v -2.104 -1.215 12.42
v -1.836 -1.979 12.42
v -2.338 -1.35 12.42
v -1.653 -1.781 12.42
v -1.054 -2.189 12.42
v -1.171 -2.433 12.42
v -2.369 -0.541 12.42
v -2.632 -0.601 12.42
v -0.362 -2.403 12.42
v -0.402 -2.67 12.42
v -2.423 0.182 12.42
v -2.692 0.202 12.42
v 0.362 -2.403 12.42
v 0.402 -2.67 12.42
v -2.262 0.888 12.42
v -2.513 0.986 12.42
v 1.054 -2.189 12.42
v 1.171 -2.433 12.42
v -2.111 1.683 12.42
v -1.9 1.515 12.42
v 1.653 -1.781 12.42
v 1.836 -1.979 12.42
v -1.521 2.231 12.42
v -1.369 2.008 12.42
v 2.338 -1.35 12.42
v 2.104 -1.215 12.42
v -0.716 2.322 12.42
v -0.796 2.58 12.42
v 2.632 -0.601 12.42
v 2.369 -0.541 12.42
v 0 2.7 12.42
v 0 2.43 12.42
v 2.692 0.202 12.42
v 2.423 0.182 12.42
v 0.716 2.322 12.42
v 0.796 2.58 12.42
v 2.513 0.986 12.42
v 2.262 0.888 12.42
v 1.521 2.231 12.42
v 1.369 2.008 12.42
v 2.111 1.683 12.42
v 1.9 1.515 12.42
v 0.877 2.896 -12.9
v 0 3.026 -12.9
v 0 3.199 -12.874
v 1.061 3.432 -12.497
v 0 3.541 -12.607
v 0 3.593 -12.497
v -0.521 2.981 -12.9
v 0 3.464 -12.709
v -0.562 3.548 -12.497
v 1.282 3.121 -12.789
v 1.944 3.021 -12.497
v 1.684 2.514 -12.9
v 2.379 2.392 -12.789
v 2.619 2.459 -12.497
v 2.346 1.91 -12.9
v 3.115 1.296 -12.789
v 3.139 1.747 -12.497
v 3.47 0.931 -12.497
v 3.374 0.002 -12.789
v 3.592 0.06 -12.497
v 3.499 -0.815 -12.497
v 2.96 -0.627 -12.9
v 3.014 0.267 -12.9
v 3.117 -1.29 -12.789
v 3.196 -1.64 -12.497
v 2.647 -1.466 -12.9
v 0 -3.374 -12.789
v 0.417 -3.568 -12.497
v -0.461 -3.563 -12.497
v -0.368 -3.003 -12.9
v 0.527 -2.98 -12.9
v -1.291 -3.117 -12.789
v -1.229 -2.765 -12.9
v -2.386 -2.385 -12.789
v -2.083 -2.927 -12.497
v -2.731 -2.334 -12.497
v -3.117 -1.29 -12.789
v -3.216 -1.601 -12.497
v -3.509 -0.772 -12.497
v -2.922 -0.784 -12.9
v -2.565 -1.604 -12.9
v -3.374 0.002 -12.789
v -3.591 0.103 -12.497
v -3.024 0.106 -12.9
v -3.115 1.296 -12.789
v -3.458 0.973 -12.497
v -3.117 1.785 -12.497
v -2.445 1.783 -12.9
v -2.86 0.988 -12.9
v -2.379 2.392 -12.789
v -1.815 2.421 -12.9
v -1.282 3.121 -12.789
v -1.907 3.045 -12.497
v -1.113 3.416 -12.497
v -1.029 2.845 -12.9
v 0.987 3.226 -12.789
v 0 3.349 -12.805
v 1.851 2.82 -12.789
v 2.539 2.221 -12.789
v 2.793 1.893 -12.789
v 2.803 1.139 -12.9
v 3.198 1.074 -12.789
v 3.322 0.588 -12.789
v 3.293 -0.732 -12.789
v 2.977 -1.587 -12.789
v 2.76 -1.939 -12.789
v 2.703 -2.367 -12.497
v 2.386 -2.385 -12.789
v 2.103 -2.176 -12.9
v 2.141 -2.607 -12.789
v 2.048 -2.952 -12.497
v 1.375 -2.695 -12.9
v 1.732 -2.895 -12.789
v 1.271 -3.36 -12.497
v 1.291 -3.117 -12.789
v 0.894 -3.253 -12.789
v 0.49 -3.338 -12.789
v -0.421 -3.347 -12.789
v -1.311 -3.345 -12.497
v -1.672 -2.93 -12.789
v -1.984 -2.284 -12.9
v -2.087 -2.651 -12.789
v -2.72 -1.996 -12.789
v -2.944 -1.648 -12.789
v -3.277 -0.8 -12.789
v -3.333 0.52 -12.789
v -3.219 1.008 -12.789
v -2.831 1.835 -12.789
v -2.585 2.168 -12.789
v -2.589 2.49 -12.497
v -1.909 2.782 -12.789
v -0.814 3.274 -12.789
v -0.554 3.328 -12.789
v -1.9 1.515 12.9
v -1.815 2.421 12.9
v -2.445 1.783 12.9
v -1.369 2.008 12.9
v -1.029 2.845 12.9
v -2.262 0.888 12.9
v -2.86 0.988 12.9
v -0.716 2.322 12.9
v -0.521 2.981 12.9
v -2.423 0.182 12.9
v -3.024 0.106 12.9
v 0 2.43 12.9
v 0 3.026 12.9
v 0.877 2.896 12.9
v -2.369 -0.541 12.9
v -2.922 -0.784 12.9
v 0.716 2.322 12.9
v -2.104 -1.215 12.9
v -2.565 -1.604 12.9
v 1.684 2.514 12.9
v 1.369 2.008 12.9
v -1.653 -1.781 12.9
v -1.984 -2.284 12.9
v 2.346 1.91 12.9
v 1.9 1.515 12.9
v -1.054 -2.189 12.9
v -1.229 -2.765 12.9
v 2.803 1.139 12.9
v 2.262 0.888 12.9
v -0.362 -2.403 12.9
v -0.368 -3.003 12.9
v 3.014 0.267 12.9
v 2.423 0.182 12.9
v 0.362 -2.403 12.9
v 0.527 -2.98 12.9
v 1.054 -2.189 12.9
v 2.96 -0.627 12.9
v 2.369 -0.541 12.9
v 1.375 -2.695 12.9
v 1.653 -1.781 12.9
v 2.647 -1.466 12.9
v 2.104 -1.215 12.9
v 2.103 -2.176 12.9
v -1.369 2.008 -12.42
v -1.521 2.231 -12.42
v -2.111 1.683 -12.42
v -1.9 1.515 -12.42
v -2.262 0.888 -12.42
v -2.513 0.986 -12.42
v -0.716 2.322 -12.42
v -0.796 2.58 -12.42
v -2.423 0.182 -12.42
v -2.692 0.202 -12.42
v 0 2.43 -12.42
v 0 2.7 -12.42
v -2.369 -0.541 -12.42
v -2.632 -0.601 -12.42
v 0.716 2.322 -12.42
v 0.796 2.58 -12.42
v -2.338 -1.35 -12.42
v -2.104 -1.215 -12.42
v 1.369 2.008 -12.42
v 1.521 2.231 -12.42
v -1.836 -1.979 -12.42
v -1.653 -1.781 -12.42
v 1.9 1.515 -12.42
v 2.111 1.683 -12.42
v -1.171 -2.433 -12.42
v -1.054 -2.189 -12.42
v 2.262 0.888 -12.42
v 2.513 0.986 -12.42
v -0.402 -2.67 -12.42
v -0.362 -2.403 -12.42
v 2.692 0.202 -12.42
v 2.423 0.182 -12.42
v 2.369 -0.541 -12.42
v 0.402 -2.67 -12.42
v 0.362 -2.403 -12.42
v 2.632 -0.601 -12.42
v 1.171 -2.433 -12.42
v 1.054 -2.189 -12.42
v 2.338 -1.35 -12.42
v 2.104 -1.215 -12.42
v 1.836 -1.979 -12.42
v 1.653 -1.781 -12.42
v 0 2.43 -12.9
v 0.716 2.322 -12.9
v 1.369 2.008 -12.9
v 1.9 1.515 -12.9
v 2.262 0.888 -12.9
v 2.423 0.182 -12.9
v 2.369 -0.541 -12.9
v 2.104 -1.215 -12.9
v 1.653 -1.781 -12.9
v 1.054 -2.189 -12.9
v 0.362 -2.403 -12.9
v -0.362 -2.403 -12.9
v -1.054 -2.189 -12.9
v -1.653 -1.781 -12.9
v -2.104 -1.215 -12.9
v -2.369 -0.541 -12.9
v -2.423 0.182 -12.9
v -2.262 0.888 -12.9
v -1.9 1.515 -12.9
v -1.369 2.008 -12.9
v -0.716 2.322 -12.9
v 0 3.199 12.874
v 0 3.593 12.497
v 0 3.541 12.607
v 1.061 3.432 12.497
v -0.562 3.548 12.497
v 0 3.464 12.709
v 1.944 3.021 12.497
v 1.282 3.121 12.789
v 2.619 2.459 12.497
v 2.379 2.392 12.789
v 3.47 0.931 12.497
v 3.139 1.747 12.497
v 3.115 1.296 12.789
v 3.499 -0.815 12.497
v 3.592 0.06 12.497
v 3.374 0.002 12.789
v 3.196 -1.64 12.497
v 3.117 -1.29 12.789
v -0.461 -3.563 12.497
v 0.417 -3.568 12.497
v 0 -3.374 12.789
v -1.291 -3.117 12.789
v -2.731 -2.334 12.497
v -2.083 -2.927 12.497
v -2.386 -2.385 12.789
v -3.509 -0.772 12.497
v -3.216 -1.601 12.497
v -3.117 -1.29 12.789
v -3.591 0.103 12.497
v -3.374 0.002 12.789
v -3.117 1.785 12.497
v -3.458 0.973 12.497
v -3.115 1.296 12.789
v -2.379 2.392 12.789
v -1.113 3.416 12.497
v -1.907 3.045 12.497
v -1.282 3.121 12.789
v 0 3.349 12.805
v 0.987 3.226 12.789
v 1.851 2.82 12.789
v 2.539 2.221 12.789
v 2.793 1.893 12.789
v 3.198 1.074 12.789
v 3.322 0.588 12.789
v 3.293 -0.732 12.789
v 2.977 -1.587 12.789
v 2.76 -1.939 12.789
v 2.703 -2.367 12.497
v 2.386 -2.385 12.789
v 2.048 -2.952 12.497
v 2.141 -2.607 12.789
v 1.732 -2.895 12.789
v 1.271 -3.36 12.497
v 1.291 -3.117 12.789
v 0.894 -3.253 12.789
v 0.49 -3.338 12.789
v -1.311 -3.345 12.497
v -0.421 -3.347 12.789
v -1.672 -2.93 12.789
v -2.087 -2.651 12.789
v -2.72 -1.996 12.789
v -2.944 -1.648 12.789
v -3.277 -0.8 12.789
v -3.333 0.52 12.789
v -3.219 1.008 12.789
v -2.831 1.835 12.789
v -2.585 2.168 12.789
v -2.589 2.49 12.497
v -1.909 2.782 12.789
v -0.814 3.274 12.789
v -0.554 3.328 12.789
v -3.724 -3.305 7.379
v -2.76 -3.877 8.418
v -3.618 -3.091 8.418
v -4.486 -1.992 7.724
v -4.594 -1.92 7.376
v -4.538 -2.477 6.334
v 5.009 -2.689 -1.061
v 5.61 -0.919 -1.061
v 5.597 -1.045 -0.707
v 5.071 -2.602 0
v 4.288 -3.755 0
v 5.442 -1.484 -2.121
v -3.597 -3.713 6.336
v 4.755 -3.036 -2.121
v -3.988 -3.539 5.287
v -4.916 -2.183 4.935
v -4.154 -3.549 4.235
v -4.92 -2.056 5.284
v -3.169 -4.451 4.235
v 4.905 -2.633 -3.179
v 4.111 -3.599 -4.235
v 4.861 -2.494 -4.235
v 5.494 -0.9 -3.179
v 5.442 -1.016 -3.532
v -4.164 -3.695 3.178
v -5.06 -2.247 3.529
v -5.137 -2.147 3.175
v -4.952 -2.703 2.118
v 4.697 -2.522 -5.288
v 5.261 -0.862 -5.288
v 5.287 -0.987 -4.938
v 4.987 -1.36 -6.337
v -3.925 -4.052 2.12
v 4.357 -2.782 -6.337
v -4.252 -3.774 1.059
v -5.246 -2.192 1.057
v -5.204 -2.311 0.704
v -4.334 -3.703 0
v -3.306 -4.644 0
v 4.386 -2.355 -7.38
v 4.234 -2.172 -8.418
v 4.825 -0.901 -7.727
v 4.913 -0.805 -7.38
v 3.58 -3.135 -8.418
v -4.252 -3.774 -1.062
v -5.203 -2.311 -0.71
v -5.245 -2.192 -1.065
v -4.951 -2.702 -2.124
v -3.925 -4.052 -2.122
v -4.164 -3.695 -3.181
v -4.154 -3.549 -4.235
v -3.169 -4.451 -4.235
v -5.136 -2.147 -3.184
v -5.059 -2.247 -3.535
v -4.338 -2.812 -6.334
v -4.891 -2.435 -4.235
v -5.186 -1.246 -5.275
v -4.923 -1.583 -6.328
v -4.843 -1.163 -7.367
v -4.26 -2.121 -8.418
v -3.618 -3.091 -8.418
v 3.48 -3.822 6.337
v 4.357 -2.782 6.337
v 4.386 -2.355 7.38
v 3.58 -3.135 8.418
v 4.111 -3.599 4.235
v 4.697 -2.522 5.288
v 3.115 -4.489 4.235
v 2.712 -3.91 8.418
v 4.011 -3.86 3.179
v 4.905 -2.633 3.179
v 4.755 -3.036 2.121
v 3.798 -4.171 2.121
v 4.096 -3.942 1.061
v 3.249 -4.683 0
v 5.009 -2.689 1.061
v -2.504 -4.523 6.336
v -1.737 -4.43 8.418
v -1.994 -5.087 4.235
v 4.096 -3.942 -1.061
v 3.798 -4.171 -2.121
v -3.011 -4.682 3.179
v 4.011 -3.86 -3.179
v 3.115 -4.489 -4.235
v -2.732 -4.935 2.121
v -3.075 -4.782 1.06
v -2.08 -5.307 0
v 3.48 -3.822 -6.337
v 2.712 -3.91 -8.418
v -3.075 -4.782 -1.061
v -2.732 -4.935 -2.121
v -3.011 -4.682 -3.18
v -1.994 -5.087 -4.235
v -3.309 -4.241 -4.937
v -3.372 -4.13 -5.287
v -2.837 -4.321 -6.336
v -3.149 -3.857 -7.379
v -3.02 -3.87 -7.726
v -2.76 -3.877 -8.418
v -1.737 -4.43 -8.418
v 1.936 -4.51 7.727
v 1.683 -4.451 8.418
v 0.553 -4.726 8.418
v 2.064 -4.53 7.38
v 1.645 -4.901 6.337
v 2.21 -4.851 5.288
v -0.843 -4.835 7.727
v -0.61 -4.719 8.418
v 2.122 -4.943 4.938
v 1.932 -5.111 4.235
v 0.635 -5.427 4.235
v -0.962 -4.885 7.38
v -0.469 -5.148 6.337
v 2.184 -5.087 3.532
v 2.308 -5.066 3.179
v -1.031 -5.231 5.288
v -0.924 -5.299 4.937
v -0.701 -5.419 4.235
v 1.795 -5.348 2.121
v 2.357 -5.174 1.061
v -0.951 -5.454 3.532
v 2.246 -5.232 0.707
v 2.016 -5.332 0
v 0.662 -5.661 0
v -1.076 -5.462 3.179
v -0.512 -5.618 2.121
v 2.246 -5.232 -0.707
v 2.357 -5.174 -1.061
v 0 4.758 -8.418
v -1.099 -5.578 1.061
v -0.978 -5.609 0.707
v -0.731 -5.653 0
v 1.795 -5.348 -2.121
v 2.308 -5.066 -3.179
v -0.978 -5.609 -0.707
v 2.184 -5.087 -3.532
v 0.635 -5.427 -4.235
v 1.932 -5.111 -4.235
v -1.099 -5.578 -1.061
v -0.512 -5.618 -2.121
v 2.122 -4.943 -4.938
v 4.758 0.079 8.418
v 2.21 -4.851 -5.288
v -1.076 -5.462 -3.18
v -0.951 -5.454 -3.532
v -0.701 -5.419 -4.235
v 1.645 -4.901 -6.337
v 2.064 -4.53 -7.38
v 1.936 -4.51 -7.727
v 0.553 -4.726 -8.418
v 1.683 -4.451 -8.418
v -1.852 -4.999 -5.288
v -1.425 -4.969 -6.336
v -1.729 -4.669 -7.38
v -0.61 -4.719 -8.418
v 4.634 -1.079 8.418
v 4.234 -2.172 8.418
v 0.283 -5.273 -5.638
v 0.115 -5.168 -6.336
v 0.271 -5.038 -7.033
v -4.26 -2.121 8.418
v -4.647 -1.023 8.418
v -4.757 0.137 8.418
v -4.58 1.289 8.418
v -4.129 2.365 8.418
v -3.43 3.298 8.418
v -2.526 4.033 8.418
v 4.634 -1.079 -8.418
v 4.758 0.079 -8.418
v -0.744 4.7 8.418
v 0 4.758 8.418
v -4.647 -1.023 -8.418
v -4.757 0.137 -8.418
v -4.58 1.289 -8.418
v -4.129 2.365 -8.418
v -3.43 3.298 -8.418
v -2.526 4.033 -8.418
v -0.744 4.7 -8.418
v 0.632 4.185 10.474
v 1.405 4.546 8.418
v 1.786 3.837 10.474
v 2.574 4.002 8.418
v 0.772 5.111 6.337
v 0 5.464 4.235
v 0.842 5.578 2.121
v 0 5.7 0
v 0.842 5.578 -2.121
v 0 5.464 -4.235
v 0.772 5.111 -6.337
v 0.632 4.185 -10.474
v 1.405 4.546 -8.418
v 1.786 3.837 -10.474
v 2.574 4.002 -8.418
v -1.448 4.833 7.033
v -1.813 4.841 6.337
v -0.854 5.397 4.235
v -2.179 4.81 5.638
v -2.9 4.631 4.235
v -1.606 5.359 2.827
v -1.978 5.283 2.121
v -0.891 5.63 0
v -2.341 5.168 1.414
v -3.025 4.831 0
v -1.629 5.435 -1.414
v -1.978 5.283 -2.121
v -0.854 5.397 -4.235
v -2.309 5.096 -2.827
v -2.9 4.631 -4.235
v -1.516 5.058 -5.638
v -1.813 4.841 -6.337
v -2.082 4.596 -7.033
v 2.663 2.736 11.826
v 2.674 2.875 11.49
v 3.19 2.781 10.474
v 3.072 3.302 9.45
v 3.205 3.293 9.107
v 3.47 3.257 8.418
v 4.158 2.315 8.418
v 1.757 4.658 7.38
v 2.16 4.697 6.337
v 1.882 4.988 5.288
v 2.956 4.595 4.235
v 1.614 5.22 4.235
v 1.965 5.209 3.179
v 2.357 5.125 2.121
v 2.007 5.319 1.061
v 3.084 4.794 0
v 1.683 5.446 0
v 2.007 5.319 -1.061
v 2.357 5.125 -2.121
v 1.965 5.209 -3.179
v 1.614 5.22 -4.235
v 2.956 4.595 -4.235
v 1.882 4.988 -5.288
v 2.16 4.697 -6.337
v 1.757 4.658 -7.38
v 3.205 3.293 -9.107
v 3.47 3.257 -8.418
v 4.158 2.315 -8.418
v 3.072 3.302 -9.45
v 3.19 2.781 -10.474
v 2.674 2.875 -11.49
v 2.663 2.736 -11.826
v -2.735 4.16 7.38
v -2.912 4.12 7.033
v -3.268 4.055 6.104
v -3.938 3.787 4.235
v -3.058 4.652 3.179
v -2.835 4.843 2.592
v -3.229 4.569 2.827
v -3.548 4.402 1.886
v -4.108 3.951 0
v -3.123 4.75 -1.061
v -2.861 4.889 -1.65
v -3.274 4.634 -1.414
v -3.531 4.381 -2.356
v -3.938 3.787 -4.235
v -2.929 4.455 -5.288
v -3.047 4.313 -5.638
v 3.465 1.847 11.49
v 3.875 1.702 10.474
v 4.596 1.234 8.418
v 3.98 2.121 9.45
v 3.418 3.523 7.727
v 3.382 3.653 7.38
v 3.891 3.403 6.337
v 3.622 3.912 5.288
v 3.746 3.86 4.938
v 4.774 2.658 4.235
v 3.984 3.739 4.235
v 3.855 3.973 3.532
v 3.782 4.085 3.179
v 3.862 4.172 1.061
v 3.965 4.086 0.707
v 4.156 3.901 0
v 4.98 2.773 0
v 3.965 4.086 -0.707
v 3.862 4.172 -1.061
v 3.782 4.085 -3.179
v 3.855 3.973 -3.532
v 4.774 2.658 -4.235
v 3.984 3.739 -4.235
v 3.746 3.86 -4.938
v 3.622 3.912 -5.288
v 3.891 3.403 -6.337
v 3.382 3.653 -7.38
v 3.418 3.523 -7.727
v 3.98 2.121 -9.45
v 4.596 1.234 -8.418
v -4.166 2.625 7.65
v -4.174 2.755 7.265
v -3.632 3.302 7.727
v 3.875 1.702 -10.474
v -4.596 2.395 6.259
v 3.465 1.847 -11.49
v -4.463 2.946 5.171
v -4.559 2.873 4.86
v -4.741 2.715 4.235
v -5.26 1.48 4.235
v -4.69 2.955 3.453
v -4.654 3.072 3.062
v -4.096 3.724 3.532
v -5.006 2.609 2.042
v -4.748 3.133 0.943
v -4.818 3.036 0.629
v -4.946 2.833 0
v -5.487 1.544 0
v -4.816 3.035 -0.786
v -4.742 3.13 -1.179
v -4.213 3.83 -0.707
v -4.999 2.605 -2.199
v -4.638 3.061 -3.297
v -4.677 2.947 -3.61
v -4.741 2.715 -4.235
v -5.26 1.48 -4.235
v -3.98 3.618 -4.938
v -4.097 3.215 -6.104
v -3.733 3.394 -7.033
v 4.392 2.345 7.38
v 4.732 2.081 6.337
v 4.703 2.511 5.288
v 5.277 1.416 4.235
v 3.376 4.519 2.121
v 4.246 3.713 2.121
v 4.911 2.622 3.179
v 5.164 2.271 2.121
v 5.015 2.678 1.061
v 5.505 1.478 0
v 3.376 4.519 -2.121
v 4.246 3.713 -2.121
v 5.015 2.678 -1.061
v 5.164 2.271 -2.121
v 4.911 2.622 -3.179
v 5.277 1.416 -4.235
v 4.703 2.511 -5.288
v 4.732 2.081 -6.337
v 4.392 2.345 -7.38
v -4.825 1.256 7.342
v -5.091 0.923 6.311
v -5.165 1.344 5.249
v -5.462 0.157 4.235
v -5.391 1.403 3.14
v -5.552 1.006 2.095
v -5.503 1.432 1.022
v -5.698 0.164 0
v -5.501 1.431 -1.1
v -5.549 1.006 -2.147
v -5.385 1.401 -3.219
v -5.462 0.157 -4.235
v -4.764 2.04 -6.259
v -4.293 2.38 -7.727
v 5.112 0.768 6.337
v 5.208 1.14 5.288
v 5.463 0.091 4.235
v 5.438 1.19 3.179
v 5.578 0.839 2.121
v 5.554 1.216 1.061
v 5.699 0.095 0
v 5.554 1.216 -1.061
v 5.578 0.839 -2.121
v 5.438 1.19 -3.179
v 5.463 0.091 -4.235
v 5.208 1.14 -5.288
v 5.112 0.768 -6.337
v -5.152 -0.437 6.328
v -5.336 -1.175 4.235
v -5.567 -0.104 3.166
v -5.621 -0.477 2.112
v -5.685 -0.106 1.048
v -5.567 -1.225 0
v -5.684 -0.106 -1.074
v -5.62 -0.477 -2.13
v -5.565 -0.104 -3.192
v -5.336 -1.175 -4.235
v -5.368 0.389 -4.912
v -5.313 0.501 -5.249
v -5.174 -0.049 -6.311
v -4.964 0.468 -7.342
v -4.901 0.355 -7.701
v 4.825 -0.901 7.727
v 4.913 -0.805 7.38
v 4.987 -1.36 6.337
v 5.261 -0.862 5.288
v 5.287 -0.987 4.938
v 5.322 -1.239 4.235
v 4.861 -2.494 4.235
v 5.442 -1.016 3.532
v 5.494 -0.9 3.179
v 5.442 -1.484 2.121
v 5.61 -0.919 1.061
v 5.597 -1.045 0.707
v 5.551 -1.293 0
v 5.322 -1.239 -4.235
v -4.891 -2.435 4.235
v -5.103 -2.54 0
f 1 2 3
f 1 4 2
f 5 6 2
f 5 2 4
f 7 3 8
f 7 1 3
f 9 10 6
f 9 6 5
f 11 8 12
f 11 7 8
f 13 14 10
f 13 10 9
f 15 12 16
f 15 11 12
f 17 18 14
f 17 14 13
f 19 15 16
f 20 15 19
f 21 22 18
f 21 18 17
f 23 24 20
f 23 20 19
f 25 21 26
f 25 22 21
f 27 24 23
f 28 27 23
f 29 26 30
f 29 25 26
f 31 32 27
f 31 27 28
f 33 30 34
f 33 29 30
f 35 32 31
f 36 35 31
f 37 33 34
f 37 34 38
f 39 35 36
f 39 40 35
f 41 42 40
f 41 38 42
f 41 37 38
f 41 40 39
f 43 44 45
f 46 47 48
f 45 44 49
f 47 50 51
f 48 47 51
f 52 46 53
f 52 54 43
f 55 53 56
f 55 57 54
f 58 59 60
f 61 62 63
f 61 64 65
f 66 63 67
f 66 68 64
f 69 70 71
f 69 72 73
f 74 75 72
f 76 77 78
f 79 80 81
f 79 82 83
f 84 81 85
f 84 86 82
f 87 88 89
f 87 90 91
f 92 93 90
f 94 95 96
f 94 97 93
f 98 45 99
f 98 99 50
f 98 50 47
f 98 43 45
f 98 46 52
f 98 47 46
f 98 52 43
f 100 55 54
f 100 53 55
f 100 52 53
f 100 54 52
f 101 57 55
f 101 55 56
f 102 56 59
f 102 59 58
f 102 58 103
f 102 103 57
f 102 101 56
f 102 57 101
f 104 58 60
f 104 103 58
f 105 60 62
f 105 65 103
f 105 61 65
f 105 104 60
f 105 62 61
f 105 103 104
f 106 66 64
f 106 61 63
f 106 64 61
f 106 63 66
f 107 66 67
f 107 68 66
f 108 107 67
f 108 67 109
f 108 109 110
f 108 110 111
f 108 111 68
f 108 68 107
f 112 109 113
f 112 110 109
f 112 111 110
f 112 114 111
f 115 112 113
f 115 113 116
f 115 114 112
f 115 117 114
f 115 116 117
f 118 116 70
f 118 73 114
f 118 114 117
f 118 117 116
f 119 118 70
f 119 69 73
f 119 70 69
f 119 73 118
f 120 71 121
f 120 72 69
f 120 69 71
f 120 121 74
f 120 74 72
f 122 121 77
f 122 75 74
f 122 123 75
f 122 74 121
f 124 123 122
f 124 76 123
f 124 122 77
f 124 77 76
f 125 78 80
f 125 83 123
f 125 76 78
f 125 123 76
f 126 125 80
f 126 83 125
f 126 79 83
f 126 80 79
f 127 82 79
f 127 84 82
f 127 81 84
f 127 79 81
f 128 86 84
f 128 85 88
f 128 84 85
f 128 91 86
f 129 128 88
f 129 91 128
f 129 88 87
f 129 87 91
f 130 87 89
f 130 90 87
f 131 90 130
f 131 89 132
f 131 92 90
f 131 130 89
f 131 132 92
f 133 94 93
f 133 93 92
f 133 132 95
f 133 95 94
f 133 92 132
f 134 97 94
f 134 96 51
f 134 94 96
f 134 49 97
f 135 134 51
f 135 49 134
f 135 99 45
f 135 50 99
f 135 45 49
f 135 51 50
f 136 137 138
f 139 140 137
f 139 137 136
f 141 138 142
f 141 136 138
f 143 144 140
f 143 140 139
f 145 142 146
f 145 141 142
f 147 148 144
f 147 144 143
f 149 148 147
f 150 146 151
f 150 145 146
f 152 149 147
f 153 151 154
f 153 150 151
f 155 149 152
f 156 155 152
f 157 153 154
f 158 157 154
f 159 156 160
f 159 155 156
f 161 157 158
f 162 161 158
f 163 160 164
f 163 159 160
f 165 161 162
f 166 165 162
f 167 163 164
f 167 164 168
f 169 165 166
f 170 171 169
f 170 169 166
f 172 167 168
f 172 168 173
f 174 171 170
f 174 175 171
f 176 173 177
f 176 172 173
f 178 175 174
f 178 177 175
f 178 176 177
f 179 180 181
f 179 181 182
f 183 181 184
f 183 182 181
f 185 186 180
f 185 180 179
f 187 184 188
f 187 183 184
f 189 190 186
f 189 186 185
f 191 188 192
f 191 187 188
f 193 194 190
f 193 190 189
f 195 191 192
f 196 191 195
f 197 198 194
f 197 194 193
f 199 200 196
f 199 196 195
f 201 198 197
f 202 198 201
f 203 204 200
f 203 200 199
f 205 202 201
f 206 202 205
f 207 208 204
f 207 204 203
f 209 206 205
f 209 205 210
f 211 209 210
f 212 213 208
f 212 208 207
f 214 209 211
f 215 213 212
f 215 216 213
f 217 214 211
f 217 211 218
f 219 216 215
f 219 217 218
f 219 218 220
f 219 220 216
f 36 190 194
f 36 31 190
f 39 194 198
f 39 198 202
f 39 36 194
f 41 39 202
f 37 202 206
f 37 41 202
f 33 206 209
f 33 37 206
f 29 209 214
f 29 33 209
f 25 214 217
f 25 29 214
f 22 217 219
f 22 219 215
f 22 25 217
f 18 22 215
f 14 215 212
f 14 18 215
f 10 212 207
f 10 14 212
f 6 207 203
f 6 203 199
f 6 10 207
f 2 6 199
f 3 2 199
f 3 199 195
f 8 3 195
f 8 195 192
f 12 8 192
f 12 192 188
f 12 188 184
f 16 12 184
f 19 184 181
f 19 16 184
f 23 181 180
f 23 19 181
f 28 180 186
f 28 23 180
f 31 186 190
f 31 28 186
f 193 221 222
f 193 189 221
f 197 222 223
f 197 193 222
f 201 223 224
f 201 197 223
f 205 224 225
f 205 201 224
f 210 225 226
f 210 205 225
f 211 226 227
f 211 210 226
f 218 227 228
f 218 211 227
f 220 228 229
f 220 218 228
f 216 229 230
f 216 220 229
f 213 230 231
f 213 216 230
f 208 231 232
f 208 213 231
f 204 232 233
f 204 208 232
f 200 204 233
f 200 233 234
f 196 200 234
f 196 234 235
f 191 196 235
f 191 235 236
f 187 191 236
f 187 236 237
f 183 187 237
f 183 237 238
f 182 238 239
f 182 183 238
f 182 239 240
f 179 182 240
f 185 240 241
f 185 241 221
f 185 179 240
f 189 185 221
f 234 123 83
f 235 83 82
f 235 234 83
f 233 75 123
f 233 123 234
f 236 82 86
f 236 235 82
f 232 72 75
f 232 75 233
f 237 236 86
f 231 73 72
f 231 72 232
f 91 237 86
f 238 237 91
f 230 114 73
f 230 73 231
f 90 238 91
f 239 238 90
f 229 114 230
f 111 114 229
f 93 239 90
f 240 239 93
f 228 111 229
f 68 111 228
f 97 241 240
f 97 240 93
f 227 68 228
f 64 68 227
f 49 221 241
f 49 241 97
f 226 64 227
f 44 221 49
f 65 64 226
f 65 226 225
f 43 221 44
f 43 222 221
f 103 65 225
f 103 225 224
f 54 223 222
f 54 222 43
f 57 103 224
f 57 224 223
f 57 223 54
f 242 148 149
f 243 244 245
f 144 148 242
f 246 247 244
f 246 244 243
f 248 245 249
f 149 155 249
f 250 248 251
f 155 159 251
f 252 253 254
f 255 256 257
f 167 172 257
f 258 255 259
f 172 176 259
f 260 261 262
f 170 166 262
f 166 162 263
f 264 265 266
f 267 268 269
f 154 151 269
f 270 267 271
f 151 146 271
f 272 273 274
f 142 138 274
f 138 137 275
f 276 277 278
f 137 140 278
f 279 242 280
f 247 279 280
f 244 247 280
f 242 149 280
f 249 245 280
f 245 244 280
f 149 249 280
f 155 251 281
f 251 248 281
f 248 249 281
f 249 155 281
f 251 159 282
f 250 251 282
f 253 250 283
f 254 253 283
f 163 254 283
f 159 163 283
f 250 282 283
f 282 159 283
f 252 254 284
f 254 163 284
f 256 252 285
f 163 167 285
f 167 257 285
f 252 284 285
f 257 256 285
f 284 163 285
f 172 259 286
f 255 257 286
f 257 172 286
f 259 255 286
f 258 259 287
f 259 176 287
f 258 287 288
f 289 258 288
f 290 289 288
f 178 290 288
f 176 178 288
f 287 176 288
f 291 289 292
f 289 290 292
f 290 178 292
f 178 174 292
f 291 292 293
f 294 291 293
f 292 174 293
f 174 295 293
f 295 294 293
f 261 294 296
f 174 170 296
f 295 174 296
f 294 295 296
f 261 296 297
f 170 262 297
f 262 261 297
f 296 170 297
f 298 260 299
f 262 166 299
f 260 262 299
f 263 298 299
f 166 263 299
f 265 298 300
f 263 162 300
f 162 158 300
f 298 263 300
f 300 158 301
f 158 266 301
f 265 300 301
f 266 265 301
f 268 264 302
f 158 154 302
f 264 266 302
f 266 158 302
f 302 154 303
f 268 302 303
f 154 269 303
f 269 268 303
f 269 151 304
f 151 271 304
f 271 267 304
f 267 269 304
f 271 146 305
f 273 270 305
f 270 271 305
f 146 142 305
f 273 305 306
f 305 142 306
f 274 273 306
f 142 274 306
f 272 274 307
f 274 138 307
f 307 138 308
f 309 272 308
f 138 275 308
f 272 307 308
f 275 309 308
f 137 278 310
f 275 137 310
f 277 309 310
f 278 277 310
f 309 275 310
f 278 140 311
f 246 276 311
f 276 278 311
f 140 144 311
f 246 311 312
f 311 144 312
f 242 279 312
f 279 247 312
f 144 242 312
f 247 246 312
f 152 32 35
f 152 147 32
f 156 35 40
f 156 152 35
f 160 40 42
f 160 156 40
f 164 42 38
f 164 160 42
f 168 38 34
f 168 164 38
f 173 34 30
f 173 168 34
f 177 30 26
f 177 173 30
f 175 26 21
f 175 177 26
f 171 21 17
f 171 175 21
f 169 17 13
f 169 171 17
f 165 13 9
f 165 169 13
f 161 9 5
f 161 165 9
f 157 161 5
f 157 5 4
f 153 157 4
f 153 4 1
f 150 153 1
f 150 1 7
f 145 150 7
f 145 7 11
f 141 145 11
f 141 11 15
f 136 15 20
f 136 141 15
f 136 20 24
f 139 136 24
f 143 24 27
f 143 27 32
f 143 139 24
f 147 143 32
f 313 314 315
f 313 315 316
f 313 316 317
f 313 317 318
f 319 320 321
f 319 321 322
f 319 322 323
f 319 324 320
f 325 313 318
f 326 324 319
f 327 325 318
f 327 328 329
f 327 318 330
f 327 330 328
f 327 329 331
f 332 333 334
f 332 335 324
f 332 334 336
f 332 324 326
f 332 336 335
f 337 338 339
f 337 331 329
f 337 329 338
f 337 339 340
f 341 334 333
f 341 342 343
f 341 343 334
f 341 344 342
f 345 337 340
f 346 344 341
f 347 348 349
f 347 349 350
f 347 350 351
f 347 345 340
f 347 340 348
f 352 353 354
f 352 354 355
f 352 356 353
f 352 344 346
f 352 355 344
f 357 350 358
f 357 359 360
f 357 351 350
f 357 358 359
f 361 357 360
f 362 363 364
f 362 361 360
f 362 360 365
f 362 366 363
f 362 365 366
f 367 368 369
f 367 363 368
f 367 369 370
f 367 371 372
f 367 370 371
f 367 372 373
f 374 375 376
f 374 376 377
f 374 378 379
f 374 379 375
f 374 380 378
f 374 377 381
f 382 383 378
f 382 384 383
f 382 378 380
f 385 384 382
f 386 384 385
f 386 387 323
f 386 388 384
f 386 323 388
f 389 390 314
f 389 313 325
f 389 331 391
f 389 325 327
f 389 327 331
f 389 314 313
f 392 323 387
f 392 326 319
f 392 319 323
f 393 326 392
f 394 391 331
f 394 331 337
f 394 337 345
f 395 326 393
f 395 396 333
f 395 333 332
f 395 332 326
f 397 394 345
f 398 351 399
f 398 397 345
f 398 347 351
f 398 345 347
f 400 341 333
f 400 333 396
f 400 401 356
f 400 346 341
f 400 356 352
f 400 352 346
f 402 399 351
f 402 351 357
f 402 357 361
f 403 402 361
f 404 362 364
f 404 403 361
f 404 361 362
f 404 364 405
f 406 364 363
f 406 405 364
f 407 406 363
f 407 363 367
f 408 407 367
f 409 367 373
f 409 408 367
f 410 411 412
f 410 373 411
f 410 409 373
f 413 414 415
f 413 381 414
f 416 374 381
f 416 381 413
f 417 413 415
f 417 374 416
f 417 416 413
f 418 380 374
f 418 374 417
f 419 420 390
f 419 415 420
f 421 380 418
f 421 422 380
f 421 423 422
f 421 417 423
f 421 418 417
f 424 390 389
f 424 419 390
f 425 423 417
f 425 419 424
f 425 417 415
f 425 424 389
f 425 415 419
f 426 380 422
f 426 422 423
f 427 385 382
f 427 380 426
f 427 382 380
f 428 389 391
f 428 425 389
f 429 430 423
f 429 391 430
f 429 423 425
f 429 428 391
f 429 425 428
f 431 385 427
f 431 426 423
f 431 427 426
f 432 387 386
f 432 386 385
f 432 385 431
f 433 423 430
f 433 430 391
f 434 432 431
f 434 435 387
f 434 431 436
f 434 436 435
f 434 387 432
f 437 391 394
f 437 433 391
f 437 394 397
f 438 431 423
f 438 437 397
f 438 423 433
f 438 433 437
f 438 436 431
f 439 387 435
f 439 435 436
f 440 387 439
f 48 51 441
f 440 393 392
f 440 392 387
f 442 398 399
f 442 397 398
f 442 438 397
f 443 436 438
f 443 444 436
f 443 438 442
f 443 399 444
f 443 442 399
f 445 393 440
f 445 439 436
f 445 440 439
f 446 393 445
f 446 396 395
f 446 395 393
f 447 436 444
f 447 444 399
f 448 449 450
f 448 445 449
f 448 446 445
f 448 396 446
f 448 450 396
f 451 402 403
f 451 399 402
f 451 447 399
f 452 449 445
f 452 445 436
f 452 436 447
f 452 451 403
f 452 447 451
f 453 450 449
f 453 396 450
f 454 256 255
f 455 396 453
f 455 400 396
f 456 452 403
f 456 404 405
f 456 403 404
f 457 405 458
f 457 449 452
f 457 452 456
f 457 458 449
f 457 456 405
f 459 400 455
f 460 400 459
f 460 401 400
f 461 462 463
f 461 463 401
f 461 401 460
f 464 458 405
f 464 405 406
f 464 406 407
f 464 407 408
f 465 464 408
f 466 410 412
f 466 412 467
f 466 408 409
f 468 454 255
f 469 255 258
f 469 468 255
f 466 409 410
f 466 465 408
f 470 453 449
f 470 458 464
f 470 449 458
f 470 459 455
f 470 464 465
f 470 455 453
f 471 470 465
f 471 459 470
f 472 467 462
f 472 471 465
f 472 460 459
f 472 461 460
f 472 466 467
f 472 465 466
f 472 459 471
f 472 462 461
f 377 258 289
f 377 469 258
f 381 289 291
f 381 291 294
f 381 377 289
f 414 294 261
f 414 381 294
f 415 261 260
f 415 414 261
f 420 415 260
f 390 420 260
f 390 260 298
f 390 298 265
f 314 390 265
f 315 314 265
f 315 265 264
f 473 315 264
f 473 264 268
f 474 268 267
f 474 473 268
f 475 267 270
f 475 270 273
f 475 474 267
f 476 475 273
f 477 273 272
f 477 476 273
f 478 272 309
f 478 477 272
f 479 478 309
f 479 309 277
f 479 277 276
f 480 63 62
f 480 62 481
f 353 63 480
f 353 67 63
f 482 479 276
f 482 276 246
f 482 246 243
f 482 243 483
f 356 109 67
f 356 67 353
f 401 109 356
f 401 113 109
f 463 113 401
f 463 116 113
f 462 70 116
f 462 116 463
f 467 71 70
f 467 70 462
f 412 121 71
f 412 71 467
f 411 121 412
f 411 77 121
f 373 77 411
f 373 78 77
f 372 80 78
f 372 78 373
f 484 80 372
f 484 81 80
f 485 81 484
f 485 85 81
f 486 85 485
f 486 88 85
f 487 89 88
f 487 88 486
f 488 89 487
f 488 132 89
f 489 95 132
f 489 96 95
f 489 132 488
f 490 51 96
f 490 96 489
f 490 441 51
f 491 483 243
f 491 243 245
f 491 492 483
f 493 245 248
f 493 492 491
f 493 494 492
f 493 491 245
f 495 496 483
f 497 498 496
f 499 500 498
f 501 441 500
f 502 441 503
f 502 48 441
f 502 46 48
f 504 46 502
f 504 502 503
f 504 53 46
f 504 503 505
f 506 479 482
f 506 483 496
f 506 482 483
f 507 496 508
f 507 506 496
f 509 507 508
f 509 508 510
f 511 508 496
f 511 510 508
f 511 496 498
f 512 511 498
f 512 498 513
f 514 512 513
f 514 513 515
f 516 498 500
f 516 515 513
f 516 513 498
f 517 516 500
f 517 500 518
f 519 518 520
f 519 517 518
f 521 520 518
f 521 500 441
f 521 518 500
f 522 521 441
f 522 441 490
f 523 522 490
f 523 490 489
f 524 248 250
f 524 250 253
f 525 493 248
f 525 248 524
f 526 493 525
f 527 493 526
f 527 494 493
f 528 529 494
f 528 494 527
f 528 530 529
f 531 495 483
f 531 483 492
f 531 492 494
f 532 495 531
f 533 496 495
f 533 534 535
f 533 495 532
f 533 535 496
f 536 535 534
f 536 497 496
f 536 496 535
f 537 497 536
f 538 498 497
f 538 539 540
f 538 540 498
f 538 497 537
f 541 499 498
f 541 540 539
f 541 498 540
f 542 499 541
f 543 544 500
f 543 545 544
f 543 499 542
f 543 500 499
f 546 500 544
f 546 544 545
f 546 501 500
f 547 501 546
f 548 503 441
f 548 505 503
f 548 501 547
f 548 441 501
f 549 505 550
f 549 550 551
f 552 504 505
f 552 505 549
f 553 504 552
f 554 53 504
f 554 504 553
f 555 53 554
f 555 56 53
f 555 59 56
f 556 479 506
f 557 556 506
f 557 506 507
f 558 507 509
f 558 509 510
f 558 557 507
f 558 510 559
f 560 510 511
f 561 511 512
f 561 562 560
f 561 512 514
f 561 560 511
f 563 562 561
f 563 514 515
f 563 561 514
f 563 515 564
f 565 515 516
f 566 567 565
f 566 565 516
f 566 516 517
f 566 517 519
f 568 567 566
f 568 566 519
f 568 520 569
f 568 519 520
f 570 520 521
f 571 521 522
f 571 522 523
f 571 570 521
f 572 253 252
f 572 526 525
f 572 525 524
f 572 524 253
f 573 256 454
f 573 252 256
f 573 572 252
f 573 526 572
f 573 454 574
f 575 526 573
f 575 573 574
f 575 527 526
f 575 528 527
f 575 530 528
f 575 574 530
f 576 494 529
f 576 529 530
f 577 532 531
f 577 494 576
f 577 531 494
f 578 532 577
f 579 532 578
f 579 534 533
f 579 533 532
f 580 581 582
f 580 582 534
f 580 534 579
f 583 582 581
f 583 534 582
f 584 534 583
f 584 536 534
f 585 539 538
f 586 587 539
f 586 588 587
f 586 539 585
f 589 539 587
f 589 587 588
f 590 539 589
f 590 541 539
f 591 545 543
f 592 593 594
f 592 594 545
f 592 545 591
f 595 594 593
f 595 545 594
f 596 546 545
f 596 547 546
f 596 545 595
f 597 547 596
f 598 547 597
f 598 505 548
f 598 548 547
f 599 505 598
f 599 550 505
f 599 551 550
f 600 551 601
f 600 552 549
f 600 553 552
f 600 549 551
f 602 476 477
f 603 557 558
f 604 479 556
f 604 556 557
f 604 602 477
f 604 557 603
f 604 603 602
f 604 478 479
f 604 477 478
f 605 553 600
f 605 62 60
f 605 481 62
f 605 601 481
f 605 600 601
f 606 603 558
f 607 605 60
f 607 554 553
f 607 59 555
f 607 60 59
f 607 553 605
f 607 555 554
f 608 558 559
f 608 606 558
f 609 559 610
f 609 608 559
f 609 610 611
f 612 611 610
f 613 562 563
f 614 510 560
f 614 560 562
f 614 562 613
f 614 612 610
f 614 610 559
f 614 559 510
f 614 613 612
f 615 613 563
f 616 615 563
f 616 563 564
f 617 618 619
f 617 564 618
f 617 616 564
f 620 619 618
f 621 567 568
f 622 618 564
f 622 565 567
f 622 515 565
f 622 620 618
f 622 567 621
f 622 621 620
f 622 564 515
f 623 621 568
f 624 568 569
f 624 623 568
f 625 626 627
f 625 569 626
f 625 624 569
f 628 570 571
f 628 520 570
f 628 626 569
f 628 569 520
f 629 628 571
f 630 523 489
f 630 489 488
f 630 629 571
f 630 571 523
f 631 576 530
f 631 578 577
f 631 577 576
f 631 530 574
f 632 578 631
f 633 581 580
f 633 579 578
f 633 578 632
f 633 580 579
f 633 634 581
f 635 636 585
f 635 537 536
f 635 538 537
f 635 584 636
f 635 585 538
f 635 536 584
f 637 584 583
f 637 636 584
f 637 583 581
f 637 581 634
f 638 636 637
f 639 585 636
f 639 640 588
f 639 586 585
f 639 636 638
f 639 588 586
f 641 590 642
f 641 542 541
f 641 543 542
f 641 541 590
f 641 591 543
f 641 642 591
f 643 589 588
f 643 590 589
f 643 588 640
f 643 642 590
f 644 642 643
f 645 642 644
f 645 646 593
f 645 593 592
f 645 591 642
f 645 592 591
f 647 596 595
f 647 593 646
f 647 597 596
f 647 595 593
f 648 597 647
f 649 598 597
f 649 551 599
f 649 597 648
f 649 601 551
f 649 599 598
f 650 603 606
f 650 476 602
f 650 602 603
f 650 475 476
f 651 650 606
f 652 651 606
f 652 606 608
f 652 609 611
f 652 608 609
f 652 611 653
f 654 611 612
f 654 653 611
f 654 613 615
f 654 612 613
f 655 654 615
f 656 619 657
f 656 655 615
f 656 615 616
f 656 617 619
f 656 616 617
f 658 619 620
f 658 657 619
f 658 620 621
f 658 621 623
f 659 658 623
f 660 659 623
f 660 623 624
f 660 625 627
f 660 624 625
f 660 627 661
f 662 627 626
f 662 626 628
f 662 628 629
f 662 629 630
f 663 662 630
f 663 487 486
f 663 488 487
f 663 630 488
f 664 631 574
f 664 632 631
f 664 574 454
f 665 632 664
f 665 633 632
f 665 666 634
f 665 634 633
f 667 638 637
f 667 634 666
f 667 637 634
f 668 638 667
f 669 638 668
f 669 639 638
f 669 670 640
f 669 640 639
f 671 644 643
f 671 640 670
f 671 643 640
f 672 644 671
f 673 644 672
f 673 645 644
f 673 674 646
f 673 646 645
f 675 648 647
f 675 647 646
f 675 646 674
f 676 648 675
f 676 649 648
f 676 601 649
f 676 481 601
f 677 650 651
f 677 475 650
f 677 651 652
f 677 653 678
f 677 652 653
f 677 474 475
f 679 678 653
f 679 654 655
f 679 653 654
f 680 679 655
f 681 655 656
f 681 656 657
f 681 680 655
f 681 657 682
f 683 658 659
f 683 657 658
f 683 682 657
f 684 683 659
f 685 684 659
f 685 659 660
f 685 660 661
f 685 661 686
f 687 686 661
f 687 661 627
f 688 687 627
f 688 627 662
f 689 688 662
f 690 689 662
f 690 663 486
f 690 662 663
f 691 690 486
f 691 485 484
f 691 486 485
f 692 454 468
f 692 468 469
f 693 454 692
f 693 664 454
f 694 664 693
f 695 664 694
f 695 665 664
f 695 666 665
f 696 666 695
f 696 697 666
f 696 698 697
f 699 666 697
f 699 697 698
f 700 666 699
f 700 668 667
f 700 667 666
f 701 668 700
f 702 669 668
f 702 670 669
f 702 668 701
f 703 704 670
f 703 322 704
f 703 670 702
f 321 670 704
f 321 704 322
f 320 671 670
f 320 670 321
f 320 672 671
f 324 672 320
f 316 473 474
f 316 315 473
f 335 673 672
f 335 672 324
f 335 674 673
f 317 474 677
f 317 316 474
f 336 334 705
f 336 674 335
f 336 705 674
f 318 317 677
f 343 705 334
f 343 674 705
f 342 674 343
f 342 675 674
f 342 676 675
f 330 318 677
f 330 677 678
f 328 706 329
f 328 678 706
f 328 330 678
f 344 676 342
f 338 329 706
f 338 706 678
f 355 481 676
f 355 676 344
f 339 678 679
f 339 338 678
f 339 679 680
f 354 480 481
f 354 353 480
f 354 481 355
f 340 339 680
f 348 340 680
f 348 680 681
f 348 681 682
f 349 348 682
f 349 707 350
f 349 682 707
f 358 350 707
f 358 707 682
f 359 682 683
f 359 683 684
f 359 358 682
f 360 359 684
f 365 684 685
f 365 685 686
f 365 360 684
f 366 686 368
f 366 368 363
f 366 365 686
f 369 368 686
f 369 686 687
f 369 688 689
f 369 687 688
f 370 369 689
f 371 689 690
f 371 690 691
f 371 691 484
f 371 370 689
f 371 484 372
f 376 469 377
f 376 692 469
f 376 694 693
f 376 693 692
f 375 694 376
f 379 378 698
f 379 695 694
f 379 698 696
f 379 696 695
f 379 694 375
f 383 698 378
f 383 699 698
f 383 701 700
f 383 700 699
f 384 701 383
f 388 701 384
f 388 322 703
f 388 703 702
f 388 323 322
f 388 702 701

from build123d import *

# Parameters (mm, degrees)
FILLET1_R    = 1
SCALE1_SCALE = 0.6


with BuildPart() as part:
    # Sketch1 → Revolve1 (revolve)
    with BuildSketch(Plane(origin=(0, 0, 0), x_dir=(0, 0, -1), z_dir=(1, 0, 0))):
        with BuildLine():
            Line((21.5, 5.75), (21.5, 4.05))
            Line((21.5, 4.05), (20.7, 4.05))
            Line((20.7, 4.05), (20.7, 4.5))
            Line((20.7, 4.5), (-20.7, 4.5))
            Line((-20.7, 4.5), (-20.7, 4.05))
            Line((-20.7, 4.05), (-21.5, 4.05))
            Line((-21.5, 4.05), (-21.5, 5.75))
            ThreePointArc((-21.5, 5.75), (0, 9.5), (21.5, 5.75))
        make_face()
    revolve(axis=Axis((0, 0, 21.5), (0, 0, -1)))

    # Fillet1
    fillet1_edges = [part.edges().sort_by_distance(p)[0] for p in [
        (0, -5.75, -21.5),
        (0, -5.75, 21.5),
    ]]
    fillet(fillet1_edges, radius=FILLET1_R)


with BuildPart() as part_1:
    # Scale1: scaled about (0, -1.9e-08, 1.86e-07)
    add(part.part.scale(SCALE1_SCALE).moved(Location((0, -8e-09, 7.4e-08))))


solid = part_1.part
